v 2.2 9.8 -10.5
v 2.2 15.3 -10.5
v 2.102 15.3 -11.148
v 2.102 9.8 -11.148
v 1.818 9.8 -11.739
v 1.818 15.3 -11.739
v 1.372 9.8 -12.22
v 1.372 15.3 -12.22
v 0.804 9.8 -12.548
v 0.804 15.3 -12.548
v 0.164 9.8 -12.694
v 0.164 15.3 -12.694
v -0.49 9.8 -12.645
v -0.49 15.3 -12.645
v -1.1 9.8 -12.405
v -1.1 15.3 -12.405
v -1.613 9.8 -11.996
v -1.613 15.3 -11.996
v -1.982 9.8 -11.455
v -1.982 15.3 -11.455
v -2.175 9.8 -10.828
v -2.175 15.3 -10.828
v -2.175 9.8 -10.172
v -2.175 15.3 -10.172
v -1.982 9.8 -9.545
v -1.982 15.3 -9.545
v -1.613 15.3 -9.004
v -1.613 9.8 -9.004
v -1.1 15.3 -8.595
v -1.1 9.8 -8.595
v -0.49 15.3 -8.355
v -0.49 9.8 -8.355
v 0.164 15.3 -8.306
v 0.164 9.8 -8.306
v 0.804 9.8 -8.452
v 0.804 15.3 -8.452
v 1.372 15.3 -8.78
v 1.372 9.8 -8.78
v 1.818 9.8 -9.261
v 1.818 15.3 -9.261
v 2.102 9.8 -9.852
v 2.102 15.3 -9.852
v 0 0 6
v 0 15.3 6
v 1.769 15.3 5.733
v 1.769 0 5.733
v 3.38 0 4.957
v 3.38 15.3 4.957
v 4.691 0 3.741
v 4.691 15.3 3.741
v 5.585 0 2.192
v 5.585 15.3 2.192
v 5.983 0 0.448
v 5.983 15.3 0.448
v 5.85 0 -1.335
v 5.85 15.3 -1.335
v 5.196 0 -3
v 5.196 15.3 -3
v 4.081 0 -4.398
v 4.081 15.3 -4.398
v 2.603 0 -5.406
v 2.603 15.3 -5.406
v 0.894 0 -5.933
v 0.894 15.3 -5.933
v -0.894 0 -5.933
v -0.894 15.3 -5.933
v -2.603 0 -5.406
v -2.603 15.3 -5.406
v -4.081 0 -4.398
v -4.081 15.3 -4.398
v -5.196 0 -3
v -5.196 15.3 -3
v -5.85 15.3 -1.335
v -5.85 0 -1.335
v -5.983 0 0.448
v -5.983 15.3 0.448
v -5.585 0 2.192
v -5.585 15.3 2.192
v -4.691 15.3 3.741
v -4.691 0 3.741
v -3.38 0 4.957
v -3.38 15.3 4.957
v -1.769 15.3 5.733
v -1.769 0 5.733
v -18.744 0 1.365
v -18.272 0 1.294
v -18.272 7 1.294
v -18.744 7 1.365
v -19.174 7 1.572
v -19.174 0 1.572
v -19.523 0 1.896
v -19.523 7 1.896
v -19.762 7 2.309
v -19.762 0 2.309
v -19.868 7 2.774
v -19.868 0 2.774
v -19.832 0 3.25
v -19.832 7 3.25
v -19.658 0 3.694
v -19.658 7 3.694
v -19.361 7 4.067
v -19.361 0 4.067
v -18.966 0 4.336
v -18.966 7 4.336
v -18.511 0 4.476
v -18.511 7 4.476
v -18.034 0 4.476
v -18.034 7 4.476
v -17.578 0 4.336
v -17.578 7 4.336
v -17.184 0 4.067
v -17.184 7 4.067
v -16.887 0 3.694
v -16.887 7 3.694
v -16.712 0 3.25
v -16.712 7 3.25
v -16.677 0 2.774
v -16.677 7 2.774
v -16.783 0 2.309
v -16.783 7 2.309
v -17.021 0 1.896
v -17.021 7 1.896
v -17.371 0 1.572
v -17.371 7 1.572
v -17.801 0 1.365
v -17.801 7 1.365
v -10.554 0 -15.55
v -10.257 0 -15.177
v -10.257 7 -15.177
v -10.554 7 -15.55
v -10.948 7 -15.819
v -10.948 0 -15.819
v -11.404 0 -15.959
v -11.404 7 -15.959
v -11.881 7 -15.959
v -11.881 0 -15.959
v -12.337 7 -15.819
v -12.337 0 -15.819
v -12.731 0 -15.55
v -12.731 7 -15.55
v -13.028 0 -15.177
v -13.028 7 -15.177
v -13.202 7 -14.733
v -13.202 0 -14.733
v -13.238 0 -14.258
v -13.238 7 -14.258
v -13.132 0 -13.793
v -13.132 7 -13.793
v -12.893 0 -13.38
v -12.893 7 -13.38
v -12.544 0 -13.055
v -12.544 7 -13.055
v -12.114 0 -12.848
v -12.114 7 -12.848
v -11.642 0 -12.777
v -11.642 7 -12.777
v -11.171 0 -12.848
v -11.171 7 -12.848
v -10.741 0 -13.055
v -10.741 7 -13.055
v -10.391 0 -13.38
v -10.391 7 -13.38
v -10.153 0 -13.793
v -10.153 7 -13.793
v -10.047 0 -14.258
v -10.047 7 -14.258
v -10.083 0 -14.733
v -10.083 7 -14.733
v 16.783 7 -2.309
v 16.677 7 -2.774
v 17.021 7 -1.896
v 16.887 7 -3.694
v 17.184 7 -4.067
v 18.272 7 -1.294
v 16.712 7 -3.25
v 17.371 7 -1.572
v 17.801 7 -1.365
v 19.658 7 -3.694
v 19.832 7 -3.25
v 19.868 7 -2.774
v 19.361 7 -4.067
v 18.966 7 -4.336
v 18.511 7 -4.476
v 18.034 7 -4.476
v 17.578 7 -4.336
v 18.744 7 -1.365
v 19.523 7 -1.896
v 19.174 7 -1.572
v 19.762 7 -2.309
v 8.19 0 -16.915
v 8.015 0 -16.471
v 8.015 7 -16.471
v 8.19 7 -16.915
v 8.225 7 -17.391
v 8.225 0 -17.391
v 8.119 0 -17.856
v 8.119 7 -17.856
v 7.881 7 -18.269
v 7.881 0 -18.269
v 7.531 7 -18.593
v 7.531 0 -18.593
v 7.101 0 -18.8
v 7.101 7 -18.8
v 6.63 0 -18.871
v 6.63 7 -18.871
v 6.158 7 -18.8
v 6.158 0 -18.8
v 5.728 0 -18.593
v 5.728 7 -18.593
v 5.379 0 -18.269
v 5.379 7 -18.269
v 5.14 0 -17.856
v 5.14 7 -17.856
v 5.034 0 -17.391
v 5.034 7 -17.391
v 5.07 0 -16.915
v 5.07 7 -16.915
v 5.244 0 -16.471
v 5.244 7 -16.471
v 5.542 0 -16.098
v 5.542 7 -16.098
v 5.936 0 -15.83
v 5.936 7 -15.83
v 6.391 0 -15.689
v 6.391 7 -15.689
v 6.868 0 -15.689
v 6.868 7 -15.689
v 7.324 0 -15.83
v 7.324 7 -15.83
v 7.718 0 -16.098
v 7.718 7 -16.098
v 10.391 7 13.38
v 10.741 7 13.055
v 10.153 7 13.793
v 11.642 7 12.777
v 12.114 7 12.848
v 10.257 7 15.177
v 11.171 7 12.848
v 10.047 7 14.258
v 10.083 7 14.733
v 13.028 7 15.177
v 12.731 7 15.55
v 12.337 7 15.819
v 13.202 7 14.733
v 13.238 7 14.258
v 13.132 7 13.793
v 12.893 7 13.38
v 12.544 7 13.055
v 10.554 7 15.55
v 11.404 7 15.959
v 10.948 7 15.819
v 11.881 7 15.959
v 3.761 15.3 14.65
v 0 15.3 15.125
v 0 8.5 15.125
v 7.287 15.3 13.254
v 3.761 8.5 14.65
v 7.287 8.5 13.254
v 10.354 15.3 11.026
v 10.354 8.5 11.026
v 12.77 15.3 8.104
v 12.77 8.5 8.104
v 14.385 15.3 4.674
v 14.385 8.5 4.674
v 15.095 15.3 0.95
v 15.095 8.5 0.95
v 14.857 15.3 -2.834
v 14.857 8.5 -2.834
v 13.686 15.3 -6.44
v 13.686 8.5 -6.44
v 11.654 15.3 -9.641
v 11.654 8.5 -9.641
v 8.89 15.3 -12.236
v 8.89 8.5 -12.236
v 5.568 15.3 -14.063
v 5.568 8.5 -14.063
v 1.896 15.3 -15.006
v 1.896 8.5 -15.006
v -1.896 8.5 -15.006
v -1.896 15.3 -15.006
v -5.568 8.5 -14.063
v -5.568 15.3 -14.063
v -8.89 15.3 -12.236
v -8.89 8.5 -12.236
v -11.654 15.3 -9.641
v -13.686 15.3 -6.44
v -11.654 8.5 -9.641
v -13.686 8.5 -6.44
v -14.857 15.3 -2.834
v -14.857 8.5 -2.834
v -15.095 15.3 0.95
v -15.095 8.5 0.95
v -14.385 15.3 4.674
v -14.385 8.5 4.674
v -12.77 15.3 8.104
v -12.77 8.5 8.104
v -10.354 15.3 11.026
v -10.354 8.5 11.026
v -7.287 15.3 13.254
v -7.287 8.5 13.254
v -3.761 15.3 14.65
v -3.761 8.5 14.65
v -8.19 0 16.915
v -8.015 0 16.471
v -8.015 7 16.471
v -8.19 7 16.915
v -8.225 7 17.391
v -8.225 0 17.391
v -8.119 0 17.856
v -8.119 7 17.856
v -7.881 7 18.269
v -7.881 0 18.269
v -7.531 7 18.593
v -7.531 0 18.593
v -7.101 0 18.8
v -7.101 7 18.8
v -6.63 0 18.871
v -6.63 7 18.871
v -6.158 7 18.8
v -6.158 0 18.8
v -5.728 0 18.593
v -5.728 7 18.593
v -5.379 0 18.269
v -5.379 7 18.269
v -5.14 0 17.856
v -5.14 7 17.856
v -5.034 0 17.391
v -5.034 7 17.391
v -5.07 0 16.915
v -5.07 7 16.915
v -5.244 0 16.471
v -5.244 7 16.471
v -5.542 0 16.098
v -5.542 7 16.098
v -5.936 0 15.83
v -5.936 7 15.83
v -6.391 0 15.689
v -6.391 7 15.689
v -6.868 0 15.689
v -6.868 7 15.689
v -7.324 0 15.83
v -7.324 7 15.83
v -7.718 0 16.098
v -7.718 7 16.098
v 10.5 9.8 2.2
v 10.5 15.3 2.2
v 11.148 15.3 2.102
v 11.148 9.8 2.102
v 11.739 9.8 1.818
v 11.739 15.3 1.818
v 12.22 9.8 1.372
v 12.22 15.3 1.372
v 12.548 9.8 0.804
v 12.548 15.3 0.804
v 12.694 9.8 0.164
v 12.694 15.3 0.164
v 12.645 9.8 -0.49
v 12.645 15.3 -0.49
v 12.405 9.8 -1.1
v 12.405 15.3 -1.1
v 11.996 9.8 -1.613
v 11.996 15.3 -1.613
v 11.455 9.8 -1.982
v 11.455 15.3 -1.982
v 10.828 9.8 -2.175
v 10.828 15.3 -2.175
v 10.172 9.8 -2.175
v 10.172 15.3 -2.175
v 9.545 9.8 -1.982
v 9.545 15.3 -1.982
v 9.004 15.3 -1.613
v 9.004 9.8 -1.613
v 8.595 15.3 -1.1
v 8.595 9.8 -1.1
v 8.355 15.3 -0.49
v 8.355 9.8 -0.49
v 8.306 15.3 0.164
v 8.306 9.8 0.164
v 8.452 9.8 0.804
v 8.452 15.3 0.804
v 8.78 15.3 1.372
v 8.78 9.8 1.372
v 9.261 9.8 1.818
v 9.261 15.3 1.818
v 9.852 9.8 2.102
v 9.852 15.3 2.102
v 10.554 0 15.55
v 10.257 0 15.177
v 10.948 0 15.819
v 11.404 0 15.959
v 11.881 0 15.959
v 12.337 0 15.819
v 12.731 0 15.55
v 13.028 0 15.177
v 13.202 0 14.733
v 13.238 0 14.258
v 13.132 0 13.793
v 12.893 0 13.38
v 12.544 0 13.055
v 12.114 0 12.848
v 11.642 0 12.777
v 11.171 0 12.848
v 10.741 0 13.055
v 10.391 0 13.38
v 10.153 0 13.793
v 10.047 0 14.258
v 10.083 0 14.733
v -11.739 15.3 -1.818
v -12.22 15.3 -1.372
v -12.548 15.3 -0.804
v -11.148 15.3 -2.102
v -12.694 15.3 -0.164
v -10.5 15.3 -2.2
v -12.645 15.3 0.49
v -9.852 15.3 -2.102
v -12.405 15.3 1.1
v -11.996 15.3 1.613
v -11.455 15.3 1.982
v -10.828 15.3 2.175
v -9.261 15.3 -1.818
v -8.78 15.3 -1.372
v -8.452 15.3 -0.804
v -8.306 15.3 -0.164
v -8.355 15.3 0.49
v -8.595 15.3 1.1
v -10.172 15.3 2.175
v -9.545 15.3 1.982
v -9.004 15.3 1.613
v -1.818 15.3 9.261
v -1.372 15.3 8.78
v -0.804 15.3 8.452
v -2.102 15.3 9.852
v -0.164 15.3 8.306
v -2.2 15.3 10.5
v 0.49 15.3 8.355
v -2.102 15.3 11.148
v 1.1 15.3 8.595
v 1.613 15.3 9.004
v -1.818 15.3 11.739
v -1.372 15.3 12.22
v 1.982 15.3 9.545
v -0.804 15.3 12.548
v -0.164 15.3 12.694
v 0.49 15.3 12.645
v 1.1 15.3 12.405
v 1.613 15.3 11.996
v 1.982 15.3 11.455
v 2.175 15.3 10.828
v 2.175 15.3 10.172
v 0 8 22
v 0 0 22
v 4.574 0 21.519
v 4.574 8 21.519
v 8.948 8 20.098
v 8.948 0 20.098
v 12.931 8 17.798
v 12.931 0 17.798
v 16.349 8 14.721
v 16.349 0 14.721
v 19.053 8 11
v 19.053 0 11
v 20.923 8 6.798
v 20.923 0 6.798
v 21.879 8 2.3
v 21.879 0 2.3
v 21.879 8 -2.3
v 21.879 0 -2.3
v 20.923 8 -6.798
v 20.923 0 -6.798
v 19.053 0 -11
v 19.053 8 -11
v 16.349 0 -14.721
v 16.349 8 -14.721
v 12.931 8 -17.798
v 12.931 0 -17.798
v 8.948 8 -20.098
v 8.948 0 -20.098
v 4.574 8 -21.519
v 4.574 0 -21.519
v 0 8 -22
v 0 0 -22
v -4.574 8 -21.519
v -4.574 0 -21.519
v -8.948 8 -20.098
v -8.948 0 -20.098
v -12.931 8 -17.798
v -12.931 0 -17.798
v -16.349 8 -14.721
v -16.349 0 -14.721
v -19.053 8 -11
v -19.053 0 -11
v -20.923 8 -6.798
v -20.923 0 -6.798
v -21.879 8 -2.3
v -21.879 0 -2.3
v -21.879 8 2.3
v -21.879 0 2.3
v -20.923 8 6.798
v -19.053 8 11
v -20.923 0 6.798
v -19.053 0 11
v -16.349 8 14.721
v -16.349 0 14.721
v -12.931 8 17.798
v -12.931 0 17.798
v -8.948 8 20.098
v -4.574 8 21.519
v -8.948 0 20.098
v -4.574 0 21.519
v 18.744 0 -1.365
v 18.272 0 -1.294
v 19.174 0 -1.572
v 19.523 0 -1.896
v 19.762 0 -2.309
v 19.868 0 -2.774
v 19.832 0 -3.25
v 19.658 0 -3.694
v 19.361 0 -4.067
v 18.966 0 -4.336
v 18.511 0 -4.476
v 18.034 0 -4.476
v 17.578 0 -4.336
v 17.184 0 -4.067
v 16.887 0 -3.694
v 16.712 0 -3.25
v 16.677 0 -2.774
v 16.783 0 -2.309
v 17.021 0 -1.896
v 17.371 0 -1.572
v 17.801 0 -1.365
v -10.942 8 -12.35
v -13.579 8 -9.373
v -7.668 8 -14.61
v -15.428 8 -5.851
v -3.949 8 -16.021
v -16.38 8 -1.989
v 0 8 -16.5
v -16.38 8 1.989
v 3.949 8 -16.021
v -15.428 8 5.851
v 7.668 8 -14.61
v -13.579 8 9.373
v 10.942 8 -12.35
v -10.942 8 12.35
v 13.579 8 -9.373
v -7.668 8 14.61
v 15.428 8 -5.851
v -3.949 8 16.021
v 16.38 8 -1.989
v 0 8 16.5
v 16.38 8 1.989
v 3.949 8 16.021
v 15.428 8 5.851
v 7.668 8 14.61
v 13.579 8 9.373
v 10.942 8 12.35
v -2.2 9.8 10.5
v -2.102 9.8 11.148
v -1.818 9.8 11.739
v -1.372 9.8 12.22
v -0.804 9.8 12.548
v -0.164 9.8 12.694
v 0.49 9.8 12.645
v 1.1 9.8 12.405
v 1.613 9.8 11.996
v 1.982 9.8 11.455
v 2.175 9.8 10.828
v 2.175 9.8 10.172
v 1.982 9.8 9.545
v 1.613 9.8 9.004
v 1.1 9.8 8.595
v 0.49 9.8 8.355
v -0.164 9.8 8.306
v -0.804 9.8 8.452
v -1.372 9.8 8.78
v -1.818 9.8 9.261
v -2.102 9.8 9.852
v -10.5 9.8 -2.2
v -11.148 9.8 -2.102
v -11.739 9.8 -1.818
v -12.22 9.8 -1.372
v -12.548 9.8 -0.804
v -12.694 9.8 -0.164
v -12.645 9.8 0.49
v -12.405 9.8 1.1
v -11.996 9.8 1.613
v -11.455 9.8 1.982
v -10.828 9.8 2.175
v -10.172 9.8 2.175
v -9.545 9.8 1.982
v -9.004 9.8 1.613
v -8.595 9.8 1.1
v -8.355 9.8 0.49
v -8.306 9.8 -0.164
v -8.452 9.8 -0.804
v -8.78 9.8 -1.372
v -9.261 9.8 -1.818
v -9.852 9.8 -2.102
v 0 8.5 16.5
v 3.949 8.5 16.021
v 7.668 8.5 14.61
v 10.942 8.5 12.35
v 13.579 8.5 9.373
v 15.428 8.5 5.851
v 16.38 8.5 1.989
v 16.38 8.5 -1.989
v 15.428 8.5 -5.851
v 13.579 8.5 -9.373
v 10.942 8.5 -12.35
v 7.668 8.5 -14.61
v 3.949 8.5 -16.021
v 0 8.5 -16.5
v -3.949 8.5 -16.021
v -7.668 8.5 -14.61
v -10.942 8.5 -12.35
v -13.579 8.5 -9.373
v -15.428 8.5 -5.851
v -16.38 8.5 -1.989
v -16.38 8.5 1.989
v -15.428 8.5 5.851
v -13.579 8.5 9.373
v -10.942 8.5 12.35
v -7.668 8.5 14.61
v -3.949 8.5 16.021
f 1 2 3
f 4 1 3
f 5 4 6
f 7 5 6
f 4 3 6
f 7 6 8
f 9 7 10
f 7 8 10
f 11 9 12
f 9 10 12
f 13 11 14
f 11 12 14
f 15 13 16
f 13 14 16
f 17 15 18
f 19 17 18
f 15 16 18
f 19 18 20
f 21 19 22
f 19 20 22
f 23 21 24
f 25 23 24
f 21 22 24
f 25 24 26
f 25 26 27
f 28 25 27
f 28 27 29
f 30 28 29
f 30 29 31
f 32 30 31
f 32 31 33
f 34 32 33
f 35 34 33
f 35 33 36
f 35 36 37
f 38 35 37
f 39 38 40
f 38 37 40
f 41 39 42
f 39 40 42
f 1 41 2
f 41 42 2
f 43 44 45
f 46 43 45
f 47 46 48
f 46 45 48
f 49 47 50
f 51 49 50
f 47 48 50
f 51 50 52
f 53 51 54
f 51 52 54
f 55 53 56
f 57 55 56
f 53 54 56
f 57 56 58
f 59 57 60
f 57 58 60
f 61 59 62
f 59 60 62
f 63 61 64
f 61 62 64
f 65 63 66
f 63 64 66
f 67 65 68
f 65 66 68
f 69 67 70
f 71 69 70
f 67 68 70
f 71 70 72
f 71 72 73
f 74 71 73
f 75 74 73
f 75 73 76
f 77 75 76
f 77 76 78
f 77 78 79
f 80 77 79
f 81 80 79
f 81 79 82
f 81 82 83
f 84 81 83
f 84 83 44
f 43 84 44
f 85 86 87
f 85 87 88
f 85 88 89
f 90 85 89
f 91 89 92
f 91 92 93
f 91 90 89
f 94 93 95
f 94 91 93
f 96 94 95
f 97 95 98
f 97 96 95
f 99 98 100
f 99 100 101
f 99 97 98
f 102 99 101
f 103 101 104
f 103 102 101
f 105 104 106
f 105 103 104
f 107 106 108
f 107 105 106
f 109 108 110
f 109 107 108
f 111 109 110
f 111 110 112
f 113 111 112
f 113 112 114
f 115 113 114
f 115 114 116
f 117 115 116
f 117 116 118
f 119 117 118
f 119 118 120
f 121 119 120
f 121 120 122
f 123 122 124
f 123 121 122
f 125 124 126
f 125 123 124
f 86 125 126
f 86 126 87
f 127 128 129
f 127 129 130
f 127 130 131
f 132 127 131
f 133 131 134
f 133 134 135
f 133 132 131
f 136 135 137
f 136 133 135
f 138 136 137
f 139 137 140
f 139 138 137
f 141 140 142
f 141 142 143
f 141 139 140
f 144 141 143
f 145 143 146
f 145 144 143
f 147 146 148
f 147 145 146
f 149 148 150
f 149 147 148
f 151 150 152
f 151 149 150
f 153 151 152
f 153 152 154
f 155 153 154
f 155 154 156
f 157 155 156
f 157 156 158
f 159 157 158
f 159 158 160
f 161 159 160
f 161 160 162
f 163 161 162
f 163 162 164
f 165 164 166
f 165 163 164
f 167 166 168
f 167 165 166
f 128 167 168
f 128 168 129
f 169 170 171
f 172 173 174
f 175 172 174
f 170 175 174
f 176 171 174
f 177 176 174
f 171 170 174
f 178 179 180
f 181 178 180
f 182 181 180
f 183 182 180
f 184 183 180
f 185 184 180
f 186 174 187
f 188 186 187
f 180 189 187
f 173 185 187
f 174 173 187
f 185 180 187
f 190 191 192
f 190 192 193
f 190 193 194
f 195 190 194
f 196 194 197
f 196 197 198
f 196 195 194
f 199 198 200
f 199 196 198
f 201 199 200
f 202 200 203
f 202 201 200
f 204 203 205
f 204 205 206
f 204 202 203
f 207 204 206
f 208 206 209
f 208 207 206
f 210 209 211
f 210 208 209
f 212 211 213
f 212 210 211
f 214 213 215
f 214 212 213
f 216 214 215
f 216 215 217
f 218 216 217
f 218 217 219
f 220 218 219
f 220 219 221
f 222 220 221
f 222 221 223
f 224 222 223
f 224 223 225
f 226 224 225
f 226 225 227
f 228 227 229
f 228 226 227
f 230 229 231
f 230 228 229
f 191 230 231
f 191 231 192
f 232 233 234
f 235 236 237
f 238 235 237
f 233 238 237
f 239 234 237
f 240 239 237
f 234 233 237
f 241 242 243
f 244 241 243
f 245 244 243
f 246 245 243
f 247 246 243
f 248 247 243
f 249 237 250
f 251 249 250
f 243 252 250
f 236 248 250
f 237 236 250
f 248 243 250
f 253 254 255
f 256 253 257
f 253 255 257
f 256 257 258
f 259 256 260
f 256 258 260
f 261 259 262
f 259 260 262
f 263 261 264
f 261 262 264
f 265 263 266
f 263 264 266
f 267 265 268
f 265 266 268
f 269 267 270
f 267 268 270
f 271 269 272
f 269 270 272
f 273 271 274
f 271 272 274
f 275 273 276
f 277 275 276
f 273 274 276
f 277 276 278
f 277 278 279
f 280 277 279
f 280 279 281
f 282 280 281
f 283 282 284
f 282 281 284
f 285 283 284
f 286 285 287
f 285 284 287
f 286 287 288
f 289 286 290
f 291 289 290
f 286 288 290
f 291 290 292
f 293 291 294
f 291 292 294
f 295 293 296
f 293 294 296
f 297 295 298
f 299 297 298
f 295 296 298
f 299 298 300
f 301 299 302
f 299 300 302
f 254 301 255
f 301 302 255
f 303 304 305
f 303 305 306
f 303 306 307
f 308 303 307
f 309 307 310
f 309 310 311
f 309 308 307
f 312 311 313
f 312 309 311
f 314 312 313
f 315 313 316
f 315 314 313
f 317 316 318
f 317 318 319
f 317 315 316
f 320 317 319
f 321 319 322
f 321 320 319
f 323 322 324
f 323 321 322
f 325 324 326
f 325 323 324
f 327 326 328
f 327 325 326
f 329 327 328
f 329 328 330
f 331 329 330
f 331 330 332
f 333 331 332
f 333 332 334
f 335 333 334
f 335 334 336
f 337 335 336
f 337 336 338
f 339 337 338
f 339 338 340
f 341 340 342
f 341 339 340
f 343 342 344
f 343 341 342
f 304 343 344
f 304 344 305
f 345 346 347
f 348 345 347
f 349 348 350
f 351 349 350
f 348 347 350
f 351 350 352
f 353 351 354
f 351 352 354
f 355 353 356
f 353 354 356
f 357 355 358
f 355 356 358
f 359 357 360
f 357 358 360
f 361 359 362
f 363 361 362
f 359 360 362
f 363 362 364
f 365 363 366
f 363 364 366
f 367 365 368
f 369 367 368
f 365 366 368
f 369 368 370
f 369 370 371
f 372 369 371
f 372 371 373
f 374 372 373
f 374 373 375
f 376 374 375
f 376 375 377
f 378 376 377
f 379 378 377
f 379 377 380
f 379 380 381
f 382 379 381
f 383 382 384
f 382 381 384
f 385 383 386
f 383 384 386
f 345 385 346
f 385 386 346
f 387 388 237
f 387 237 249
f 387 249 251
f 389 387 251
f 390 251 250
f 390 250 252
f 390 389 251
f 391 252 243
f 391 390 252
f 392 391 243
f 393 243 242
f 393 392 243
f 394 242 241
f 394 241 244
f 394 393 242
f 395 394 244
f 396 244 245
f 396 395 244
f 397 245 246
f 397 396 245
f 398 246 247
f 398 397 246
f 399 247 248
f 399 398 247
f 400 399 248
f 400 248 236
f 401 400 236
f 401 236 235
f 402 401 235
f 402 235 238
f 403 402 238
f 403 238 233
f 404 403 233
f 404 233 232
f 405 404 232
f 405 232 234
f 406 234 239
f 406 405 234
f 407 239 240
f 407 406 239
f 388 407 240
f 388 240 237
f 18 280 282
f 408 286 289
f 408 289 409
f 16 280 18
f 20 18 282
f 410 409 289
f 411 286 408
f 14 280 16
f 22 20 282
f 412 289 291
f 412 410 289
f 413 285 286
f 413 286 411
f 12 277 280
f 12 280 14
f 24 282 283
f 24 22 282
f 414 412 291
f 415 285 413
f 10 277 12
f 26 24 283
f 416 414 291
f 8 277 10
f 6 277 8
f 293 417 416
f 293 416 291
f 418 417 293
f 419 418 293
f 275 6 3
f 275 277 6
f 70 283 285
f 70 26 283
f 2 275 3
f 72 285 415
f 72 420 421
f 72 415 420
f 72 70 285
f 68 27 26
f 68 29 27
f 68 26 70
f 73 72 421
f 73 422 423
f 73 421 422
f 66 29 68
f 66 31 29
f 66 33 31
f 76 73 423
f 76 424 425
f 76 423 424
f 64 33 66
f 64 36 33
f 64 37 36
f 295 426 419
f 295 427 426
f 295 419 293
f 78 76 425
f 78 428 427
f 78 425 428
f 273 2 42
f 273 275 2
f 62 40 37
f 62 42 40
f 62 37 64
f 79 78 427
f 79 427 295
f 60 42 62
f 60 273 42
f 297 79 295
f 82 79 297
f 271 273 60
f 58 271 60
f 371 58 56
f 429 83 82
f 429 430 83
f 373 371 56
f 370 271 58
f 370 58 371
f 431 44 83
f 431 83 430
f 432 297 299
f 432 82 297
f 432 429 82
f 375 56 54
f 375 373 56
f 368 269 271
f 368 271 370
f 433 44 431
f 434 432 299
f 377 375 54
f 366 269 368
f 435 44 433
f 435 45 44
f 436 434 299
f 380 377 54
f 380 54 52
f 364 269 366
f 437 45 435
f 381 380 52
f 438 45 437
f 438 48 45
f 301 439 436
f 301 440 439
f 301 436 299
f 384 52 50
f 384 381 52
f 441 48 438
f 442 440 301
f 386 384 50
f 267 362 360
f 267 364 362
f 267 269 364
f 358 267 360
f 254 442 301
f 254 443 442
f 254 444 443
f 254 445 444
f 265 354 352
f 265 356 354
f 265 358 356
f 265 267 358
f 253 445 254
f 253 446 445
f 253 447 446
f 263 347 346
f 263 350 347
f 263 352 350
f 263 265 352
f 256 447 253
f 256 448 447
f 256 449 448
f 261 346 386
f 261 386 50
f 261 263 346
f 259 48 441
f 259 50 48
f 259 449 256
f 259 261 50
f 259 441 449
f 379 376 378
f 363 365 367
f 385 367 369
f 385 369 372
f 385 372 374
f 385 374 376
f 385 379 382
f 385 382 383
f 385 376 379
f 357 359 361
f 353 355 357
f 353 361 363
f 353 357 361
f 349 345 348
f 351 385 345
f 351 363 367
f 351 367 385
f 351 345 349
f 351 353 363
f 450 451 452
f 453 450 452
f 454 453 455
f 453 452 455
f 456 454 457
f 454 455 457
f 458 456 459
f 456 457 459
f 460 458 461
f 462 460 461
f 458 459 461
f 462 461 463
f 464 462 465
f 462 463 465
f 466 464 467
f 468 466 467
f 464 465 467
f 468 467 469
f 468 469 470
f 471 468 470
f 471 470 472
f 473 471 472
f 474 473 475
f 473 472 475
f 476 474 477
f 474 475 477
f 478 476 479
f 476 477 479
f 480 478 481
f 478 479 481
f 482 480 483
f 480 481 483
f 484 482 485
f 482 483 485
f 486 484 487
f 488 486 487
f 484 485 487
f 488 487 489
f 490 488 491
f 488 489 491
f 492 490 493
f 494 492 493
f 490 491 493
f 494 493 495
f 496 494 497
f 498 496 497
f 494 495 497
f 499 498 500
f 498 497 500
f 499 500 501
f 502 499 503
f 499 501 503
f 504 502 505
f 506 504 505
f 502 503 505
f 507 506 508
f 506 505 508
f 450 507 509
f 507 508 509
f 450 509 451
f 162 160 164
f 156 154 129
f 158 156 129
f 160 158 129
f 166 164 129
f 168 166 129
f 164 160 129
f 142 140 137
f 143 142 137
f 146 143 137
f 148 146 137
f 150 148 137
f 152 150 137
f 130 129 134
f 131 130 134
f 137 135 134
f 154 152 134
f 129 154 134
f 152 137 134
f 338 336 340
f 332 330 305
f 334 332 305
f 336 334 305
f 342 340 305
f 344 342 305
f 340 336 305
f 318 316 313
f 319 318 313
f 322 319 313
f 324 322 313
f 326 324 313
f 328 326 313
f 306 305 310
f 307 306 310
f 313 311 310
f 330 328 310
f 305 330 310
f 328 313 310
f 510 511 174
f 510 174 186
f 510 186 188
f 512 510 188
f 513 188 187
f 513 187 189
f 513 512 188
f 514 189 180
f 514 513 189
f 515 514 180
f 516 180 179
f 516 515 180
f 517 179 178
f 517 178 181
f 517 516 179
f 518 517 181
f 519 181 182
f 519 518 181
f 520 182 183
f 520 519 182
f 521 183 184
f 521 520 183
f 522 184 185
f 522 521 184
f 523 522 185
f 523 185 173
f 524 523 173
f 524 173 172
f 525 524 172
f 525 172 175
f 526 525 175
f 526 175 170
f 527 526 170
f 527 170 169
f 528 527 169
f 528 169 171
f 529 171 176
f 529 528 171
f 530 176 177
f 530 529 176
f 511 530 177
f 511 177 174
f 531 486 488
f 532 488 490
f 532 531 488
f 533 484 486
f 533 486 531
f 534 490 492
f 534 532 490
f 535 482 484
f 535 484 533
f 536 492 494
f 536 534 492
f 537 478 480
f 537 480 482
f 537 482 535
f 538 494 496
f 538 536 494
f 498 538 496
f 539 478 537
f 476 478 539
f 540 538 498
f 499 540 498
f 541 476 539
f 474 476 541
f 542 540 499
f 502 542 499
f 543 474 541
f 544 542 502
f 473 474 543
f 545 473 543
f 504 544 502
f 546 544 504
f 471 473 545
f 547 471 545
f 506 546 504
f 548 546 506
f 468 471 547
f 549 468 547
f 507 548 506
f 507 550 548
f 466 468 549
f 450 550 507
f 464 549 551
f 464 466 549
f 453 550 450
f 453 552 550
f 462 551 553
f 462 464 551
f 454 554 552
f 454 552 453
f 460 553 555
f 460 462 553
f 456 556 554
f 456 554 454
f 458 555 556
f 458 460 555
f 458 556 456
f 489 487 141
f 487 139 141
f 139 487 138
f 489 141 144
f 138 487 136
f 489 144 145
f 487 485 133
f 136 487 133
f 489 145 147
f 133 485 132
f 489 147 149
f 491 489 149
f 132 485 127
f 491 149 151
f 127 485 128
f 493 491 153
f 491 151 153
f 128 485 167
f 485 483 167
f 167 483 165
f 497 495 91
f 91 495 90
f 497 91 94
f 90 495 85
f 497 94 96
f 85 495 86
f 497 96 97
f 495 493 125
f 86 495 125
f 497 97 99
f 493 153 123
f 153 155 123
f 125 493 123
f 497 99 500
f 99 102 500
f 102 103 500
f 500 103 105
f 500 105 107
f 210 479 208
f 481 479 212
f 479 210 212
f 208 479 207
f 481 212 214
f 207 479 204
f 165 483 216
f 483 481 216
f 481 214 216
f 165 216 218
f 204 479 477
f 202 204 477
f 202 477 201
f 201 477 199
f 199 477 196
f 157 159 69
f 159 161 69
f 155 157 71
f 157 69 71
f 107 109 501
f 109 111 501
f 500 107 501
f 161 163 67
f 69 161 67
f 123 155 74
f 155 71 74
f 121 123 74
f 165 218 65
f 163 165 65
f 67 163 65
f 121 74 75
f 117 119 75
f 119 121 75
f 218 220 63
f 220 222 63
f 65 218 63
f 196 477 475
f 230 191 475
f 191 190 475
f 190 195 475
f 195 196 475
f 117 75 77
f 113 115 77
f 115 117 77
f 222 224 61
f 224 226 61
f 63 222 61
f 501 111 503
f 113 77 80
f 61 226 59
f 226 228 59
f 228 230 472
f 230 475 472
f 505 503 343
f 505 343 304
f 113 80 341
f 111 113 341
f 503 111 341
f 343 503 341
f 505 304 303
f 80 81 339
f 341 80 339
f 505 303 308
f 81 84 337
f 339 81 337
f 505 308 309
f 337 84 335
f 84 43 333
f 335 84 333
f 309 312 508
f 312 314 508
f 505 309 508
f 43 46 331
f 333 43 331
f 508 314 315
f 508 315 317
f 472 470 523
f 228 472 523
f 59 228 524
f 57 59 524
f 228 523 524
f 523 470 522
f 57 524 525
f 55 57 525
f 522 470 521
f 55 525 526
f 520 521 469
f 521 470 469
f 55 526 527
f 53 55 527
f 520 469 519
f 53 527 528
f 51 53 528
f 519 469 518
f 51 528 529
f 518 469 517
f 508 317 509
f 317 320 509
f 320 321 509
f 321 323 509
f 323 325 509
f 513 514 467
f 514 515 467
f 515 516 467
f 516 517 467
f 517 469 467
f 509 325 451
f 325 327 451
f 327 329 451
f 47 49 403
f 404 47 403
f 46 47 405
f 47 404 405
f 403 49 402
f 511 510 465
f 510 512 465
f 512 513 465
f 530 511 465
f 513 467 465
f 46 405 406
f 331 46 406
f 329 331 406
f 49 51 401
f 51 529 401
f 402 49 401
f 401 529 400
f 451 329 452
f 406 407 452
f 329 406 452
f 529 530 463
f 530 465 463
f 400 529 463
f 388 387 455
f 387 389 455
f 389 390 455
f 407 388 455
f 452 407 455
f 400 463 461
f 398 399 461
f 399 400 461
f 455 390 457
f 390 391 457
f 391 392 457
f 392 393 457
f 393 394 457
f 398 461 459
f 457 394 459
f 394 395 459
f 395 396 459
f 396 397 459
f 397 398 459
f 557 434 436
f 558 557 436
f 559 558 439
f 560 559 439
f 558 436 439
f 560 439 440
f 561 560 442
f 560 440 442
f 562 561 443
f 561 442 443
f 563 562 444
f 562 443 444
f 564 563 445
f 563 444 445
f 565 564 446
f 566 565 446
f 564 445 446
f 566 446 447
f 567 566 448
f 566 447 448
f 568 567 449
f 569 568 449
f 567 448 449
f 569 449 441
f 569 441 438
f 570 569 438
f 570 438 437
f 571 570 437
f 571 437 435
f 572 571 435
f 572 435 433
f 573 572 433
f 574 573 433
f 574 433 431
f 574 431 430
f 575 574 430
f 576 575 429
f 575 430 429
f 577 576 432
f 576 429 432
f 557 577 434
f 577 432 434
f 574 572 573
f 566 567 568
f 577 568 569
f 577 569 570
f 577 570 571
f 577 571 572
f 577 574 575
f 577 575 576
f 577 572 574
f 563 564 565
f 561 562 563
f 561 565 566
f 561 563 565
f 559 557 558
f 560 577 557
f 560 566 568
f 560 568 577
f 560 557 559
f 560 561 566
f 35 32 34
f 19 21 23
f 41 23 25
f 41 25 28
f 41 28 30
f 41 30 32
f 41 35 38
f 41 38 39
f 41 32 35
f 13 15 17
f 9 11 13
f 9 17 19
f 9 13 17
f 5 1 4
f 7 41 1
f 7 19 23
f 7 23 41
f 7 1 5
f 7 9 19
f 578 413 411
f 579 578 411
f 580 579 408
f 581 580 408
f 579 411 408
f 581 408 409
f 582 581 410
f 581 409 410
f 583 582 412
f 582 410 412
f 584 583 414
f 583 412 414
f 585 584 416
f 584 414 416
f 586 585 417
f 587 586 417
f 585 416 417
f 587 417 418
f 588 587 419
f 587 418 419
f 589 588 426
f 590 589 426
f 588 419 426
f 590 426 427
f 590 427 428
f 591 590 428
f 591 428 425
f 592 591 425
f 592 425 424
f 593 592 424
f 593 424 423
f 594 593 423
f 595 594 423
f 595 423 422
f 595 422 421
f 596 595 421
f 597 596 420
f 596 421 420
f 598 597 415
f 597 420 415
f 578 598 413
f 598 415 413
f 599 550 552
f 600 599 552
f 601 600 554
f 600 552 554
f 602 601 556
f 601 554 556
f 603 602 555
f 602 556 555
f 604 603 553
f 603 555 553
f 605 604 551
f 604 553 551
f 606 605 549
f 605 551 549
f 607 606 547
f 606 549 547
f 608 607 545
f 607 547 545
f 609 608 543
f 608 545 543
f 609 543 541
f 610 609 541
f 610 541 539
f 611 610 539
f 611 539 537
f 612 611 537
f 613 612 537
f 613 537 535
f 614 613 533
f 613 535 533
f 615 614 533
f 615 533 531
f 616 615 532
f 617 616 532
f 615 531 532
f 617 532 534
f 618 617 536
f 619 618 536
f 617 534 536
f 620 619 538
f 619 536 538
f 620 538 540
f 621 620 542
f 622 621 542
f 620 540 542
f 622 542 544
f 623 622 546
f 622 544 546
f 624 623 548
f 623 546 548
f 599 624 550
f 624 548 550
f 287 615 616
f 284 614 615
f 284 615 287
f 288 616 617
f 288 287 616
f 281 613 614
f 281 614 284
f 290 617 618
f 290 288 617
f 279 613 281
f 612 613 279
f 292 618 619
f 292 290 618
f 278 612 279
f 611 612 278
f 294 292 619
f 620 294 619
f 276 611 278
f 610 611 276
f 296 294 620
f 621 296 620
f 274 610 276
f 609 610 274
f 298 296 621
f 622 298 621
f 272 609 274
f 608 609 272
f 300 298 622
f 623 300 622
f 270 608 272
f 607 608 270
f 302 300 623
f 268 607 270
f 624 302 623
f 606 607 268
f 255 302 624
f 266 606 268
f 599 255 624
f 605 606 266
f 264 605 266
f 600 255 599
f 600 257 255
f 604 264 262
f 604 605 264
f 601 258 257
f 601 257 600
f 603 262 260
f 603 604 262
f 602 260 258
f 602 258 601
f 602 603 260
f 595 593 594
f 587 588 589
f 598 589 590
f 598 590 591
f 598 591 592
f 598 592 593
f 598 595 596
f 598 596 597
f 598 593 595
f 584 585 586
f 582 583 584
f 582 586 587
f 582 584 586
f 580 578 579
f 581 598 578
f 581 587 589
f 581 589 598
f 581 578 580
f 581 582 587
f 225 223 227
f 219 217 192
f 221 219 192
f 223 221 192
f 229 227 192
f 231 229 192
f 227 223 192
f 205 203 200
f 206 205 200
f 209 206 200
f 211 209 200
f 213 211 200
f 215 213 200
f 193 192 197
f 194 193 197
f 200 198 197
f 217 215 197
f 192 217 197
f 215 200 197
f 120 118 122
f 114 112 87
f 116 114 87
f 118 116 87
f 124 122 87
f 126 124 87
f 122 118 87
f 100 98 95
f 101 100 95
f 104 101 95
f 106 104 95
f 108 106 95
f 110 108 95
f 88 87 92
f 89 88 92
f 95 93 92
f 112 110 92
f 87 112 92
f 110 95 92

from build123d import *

# Parameters (mm, degrees)
SKETCH1_R           = 22
BOSS_EXTRUDE1_DEPTH = 8
SKETCH2_R           = 16.5
BOSS_EXTRUDE2_DEPTH = 0.5
SKETCH3_R           = 15.125
BOSS_EXTRUDE3_DEPTH = 6.8
SKETCH4_R           = 6
CUT_EXTRUDE1_DEPTH  = 35.671169579
SKETCH5_R           = 1.6
CUT_EXTRUDE2_DEPTH  = 7
CIRPATTERN1_COUNT   = 6
SKETCH6_R           = 2.2
CUT_EXTRUDE3_DEPTH  = 5.5
CIRPATTERN2_COUNT   = 4


with BuildPart() as part:
    # Sketch1 → Boss-Extrude1 (new body)
    with BuildSketch(Plane(origin=(0, 0, 0), x_dir=(1, 0, 0), z_dir=(0, 1, 0))):
        with Locations(Location((0, 0, 0), (0, 0, 270))):
            Circle(SKETCH1_R)
    extrude(amount=BOSS_EXTRUDE1_DEPTH)

    # Sketch2 → Boss-Extrude2 (add)
    with BuildSketch(Plane(origin=(0, 8, 0), x_dir=(1, 0, 0), z_dir=(0, 1, 0))):
        with Locations(Location((0, 0, 0), (0, 0, 270))):
            Circle(SKETCH2_R)
    extrude(amount=BOSS_EXTRUDE2_DEPTH)

    # Sketch3 → Boss-Extrude3 (add)
    with BuildSketch(Plane(origin=(0, 8.5, 0), x_dir=(1, 0, 0), z_dir=(0, 1, 0))):
        with Locations(Location((0, 0, 0), (0, 0, 270))):
            Circle(SKETCH3_R)
    extrude(amount=BOSS_EXTRUDE3_DEPTH)

    # Sketch4 → Cut-Extrude1 (cut, through all)
    with BuildSketch(Plane(origin=(0, 15.3, 0), x_dir=(1, 0, 0), z_dir=(0, 1, 0))):
        with Locations(Location((0, 0, 0), (0, 0, 270))):
            Circle(SKETCH4_R)
    extrude(amount=-CUT_EXTRUDE1_DEPTH, mode=Mode.SUBTRACT)

    # Sketch5 → Cut-Extrude2 (cut)
    with BuildSketch(Plane(origin=(0, 0, 0), x_dir=(1, 0, 0), z_dir=(0, 1, 0))):
        with Locations(Location((18.272234301, 2.894037603, 0), (0, 0, 270))):
            Circle(SKETCH5_R)
    cut_extrude2 = extrude(amount=CUT_EXTRUDE2_DEPTH, mode=Mode.SUBTRACT)

    # CirPattern1: Cut-Extrude2 ×6 about axis
    cirpattern1_axis = Axis((0, 0, 0), (0, 1, 0))
    for i in range(1, CIRPATTERN1_COUNT):
        add(cut_extrude2.rotate(cirpattern1_axis, i * 360 / CIRPATTERN1_COUNT), mode=Mode.SUBTRACT)

    # Sketch6 → Cut-Extrude3 (cut)
    with BuildSketch(Plane(origin=(0, 15.3, 0), x_dir=(1, 0, 0), z_dir=(0, 1, 0))):
        with Locations(Location((10.5, 0, 0), (0, 0, 270))):
            Circle(SKETCH6_R)
    cut_extrude3 = extrude(amount=-CUT_EXTRUDE3_DEPTH, mode=Mode.SUBTRACT)

    # CirPattern2: Cut-Extrude3 ×4 about axis
    cirpattern2_axis = Axis((0, 0, 0), (0, 1, 0))
    for i in range(1, CIRPATTERN2_COUNT):
        add(cut_extrude3.rotate(cirpattern2_axis, i * 360 / CIRPATTERN2_COUNT), mode=Mode.SUBTRACT)


solid = part.part
